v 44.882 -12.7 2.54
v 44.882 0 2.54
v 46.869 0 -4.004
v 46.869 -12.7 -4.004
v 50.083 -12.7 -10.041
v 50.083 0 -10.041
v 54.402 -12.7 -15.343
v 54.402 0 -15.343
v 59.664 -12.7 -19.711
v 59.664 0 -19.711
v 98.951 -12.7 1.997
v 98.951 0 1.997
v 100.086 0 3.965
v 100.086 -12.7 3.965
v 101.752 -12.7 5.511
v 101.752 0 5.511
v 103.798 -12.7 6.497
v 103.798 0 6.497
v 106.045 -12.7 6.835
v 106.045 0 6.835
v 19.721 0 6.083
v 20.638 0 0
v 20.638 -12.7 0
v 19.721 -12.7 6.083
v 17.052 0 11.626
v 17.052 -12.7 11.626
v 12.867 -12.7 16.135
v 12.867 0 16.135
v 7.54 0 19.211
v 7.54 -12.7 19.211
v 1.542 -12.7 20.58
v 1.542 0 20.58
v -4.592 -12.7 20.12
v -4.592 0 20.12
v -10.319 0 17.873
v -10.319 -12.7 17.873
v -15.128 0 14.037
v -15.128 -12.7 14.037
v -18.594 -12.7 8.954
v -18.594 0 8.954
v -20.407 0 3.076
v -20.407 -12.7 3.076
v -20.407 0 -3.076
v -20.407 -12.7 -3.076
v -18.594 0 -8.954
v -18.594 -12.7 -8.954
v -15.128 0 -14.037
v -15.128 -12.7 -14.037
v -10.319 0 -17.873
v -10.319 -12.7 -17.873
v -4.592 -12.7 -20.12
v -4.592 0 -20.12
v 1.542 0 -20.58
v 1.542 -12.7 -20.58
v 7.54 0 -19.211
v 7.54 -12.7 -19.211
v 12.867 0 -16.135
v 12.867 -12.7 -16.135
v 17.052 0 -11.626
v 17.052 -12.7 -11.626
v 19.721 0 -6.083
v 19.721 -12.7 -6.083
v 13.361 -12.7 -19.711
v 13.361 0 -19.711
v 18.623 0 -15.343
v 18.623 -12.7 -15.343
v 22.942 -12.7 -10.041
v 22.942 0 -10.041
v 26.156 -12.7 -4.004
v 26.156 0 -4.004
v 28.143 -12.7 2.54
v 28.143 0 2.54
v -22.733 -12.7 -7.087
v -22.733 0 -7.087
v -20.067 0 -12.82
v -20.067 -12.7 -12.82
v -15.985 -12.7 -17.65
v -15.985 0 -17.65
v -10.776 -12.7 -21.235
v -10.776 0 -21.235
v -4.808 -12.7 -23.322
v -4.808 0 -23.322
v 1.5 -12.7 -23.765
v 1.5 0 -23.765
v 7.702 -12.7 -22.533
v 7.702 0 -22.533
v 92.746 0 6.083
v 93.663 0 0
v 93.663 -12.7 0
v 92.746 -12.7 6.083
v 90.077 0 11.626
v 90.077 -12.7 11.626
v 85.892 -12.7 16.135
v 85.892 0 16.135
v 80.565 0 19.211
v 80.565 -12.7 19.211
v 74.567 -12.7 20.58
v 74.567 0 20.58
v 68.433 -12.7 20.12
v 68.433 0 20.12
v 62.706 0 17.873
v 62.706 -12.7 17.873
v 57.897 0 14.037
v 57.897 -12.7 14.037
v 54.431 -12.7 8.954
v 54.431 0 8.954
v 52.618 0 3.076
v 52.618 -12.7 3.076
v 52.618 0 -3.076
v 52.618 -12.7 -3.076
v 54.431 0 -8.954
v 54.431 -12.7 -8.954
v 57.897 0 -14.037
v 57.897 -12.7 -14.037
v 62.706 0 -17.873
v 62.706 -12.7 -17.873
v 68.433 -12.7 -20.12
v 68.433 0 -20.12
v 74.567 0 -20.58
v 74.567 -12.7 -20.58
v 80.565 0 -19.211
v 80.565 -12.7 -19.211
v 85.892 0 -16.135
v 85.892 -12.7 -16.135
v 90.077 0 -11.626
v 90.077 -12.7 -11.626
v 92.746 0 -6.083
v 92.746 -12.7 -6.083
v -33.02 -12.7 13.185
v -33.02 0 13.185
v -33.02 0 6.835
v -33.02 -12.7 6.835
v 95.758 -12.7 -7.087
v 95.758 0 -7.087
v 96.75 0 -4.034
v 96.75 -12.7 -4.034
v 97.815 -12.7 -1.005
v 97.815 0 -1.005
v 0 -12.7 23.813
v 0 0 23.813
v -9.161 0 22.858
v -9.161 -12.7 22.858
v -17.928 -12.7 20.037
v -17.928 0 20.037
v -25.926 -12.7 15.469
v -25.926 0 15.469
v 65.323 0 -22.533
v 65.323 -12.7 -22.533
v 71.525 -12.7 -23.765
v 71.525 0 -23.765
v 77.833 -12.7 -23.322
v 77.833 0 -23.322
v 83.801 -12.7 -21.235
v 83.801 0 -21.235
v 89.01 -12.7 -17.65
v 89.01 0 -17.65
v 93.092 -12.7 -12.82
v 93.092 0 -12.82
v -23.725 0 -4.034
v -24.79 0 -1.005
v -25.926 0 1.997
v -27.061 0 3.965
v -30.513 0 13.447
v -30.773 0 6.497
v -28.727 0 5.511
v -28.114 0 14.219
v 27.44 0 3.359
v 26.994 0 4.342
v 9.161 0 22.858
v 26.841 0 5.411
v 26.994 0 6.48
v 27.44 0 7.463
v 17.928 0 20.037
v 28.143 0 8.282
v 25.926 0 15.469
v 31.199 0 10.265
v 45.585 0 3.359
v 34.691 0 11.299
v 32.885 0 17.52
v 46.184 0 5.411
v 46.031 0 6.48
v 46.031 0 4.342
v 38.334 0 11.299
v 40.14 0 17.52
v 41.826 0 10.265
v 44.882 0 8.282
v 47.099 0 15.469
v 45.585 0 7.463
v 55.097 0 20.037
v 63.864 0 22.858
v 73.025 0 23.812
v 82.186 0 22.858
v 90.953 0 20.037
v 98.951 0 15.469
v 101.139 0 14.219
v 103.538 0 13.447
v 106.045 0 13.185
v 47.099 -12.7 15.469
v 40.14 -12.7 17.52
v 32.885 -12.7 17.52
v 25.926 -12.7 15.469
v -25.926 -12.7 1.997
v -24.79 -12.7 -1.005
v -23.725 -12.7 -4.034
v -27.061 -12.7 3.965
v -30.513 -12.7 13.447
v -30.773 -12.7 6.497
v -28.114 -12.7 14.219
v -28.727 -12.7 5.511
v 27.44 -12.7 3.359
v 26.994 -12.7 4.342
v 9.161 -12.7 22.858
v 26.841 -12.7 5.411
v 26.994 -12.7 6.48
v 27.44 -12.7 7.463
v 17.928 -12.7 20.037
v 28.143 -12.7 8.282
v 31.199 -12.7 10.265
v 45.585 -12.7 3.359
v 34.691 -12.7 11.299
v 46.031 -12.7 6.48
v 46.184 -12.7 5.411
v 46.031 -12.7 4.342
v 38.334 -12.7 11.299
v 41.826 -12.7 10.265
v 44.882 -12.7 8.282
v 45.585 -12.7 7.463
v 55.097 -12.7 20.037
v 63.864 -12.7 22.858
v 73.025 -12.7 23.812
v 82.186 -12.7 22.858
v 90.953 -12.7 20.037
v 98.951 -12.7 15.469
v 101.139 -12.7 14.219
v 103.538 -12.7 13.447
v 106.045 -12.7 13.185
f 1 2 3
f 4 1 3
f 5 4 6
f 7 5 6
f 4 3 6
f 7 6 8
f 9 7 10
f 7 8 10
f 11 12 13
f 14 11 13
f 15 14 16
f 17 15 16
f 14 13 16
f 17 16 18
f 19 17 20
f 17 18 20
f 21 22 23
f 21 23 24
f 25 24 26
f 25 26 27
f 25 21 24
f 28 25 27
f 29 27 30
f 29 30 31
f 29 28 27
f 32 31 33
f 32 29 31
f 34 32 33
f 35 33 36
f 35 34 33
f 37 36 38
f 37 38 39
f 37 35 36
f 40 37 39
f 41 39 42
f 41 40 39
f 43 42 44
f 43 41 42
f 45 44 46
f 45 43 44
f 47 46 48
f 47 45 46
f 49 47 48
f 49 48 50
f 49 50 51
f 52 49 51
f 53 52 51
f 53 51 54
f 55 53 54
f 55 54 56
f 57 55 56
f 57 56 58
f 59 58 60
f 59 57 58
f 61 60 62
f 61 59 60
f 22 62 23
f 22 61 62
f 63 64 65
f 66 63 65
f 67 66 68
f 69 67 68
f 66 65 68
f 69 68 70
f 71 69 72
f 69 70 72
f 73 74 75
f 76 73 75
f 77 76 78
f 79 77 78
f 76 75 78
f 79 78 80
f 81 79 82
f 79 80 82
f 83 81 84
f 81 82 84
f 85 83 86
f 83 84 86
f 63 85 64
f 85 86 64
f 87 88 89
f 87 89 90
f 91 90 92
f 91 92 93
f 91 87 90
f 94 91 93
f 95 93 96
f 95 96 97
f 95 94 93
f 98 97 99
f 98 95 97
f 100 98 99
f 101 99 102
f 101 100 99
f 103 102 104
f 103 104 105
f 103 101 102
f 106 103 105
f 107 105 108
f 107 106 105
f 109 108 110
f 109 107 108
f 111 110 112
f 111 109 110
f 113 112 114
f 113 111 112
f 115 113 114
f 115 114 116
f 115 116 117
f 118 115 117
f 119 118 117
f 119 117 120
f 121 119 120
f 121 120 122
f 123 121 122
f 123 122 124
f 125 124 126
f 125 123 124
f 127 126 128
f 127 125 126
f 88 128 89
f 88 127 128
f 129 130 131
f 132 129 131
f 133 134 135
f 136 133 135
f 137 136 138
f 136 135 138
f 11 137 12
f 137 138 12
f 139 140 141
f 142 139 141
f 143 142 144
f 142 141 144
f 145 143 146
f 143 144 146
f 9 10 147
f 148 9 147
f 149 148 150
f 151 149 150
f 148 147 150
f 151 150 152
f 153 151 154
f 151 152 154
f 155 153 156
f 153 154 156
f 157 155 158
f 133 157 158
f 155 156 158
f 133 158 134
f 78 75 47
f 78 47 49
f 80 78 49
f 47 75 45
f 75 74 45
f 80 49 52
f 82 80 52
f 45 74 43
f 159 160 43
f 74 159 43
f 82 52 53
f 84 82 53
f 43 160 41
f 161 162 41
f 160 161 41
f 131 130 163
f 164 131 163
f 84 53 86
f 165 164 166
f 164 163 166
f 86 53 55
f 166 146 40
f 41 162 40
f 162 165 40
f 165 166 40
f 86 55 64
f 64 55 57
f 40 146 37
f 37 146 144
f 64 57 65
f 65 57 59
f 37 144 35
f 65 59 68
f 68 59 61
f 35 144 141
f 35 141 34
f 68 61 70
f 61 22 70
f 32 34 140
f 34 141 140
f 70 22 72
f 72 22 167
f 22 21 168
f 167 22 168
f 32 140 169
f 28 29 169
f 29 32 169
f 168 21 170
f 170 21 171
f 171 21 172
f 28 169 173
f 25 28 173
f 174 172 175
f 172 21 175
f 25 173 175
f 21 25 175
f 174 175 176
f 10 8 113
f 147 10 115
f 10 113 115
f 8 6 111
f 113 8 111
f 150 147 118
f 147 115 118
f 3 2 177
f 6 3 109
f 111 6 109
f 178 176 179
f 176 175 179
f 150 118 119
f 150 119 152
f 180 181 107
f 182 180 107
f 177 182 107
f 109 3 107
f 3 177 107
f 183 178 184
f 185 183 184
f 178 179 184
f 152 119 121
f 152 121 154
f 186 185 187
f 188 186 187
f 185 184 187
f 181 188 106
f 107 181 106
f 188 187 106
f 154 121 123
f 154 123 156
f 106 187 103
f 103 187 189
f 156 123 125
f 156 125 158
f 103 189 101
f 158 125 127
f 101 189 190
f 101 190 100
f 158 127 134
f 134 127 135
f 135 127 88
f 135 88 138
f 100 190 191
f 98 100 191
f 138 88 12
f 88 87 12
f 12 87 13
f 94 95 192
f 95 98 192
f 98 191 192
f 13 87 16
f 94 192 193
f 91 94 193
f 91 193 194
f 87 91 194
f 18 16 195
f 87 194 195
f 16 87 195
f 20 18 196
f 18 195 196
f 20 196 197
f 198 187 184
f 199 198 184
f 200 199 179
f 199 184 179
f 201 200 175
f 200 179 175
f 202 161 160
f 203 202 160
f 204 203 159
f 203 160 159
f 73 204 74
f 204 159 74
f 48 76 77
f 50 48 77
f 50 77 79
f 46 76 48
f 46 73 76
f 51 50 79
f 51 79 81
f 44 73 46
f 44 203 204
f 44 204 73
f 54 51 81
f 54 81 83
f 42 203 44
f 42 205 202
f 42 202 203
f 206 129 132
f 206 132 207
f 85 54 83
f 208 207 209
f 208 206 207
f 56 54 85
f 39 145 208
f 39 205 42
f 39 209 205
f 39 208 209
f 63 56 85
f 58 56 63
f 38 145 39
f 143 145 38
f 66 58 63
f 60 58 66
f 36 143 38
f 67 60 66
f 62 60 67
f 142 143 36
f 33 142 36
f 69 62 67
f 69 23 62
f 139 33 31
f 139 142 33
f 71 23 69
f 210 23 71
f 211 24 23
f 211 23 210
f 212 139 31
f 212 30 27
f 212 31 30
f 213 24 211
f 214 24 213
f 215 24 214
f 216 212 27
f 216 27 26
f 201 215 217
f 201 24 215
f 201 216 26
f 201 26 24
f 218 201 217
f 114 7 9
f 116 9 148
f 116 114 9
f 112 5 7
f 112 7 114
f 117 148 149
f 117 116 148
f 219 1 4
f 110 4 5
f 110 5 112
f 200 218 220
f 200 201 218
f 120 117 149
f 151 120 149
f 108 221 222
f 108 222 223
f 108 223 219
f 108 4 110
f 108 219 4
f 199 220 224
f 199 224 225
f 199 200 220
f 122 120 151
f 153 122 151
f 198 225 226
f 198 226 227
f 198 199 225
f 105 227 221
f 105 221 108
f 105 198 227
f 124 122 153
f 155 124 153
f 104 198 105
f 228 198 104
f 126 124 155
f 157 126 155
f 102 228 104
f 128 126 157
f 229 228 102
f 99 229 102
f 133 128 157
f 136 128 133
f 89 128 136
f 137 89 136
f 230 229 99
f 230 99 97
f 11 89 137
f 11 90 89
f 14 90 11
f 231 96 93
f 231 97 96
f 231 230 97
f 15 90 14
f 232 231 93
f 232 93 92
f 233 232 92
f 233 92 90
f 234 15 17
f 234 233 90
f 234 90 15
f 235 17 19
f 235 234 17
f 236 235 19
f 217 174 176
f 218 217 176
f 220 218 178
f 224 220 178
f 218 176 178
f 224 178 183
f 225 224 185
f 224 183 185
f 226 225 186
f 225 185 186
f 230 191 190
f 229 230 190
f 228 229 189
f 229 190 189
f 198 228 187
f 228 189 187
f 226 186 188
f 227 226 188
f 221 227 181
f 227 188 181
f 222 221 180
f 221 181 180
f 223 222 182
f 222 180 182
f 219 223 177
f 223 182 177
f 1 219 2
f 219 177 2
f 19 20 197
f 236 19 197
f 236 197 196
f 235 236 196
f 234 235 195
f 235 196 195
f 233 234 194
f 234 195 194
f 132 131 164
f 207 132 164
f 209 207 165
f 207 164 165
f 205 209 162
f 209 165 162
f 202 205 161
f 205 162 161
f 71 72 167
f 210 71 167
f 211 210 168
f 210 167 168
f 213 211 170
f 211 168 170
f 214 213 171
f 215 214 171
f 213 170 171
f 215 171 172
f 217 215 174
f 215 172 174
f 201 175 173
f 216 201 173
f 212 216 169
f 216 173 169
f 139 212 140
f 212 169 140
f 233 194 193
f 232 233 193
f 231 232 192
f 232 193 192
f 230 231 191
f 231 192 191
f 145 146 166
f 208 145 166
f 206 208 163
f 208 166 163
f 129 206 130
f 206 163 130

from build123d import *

# Parameters (mm, degrees)
F0_R     = 20.6375
F1_DEPTH = 12.7


with BuildPart() as f1:
    # F0 (on Front) → F1 (new body)
    with BuildSketch(Plane.XZ):
        with BuildLine():
            ThreePointArc((0, 23.8125), (16.83798, 16.83798), (23.8125, 0))
            ThreePointArc((23.8125, 0), (21.037854, -11.155441), (13.360522, -19.711205))
            ThreePointArc((13.360522, -19.711205), (22.941831, -10.040538), (28.143111, 2.54))
            ThreePointArc((28.143111, 2.54), (26.841467, 5.411069), (28.143111, 8.282137))
            ThreePointArc((28.143111, 8.282137), (36.5125, 11.43), (44.881889, 8.282137))
            ThreePointArc((44.881889, 8.282137), (46.183533, 5.411069), (44.881889, 2.54))
            ThreePointArc((44.881889, 2.54), (50.083169, -10.040538), (59.664478, -19.711205))
            ThreePointArc((59.664478, -19.711205), (50.260903, 6.987921), (73.025, 23.8125))
            ThreePointArc((73.025, 23.8125), (59.407251, 21.675139), (47.099111, 15.468605))
            ThreePointArc((47.099111, 15.468605), (36.5125, 17.78), (25.925889, 15.468605))
            ThreePointArc((25.925889, 15.468605), (13.617749, 21.675139), (0, 23.8125))
        make_face()
        with BuildLine():
            ThreePointArc((13.360522, -19.711205), (21.037854, -11.155441), (23.8125, 0))
            ThreePointArc((23.8125, 0), (16.83798, 16.83798), (0, 23.8125))
            ThreePointArc((0, 23.8125), (-19.180682, 14.111577), (-22.73341, -7.087116))
            ThreePointArc((-22.73341, -7.087116), (-7.861594, -22.477333), (13.360522, -19.711205))
        make_face()
        Circle(F0_R, mode=Mode.SUBTRACT)
        with BuildLine():
            ThreePointArc((-22.73341, -7.087116), (-19.180682, 14.111577), (0, 23.8125))
            ThreePointArc((0, 23.8125), (-13.617749, 21.675139), (-25.925889, 15.468605))
            ThreePointArc((-25.925889, 15.468605), (-29.29377, 13.770308), (-33.02, 13.185461))
            Line((-33.02, 13.185461), (-33.02, 6.835461))
            ThreePointArc((-33.02, 6.835461), (-28.726536, 5.510743), (-25.925889, 1.997185))
            ThreePointArc((-25.925889, 1.997185), (-24.248459, -2.516433), (-22.73341, -7.087116))
        make_face()
        with BuildLine():
            ThreePointArc((96.8375, 0), (89.86298, 16.83798), (73.025, 23.8125))
            ThreePointArc((73.025, 23.8125), (50.260903, 6.987921), (59.664478, -19.711205))
            ThreePointArc((59.664478, -19.711205), (80.886594, -22.477333), (95.75841, -7.087116))
            ThreePointArc((95.75841, -7.087116), (96.566182, -3.584399), (96.8375, 0))
        make_face()
        with Locations((73.025, 0)):
            Circle(F0_R, mode=Mode.SUBTRACT)
        with BuildLine():
            ThreePointArc((98.950889, 15.468605), (86.642749, 21.675139), (73.025, 23.8125))
            ThreePointArc((73.025, 23.8125), (89.86298, 16.83798), (96.8375, 0))
            ThreePointArc((96.8375, 0), (96.566182, -3.584399), (95.75841, -7.087116))
            ThreePointArc((95.75841, -7.087116), (97.273459, -2.516433), (98.950889, 1.997185))
            ThreePointArc((98.950889, 1.997185), (101.751536, 5.510743), (106.045, 6.835461))
            Line((106.045, 6.835461), (106.045, 13.185461))
            ThreePointArc((106.045, 13.185461), (102.31877, 13.770308), (98.950889, 15.468605))
        make_face()
    extrude(amount=F1_DEPTH)


solid = f1.part
